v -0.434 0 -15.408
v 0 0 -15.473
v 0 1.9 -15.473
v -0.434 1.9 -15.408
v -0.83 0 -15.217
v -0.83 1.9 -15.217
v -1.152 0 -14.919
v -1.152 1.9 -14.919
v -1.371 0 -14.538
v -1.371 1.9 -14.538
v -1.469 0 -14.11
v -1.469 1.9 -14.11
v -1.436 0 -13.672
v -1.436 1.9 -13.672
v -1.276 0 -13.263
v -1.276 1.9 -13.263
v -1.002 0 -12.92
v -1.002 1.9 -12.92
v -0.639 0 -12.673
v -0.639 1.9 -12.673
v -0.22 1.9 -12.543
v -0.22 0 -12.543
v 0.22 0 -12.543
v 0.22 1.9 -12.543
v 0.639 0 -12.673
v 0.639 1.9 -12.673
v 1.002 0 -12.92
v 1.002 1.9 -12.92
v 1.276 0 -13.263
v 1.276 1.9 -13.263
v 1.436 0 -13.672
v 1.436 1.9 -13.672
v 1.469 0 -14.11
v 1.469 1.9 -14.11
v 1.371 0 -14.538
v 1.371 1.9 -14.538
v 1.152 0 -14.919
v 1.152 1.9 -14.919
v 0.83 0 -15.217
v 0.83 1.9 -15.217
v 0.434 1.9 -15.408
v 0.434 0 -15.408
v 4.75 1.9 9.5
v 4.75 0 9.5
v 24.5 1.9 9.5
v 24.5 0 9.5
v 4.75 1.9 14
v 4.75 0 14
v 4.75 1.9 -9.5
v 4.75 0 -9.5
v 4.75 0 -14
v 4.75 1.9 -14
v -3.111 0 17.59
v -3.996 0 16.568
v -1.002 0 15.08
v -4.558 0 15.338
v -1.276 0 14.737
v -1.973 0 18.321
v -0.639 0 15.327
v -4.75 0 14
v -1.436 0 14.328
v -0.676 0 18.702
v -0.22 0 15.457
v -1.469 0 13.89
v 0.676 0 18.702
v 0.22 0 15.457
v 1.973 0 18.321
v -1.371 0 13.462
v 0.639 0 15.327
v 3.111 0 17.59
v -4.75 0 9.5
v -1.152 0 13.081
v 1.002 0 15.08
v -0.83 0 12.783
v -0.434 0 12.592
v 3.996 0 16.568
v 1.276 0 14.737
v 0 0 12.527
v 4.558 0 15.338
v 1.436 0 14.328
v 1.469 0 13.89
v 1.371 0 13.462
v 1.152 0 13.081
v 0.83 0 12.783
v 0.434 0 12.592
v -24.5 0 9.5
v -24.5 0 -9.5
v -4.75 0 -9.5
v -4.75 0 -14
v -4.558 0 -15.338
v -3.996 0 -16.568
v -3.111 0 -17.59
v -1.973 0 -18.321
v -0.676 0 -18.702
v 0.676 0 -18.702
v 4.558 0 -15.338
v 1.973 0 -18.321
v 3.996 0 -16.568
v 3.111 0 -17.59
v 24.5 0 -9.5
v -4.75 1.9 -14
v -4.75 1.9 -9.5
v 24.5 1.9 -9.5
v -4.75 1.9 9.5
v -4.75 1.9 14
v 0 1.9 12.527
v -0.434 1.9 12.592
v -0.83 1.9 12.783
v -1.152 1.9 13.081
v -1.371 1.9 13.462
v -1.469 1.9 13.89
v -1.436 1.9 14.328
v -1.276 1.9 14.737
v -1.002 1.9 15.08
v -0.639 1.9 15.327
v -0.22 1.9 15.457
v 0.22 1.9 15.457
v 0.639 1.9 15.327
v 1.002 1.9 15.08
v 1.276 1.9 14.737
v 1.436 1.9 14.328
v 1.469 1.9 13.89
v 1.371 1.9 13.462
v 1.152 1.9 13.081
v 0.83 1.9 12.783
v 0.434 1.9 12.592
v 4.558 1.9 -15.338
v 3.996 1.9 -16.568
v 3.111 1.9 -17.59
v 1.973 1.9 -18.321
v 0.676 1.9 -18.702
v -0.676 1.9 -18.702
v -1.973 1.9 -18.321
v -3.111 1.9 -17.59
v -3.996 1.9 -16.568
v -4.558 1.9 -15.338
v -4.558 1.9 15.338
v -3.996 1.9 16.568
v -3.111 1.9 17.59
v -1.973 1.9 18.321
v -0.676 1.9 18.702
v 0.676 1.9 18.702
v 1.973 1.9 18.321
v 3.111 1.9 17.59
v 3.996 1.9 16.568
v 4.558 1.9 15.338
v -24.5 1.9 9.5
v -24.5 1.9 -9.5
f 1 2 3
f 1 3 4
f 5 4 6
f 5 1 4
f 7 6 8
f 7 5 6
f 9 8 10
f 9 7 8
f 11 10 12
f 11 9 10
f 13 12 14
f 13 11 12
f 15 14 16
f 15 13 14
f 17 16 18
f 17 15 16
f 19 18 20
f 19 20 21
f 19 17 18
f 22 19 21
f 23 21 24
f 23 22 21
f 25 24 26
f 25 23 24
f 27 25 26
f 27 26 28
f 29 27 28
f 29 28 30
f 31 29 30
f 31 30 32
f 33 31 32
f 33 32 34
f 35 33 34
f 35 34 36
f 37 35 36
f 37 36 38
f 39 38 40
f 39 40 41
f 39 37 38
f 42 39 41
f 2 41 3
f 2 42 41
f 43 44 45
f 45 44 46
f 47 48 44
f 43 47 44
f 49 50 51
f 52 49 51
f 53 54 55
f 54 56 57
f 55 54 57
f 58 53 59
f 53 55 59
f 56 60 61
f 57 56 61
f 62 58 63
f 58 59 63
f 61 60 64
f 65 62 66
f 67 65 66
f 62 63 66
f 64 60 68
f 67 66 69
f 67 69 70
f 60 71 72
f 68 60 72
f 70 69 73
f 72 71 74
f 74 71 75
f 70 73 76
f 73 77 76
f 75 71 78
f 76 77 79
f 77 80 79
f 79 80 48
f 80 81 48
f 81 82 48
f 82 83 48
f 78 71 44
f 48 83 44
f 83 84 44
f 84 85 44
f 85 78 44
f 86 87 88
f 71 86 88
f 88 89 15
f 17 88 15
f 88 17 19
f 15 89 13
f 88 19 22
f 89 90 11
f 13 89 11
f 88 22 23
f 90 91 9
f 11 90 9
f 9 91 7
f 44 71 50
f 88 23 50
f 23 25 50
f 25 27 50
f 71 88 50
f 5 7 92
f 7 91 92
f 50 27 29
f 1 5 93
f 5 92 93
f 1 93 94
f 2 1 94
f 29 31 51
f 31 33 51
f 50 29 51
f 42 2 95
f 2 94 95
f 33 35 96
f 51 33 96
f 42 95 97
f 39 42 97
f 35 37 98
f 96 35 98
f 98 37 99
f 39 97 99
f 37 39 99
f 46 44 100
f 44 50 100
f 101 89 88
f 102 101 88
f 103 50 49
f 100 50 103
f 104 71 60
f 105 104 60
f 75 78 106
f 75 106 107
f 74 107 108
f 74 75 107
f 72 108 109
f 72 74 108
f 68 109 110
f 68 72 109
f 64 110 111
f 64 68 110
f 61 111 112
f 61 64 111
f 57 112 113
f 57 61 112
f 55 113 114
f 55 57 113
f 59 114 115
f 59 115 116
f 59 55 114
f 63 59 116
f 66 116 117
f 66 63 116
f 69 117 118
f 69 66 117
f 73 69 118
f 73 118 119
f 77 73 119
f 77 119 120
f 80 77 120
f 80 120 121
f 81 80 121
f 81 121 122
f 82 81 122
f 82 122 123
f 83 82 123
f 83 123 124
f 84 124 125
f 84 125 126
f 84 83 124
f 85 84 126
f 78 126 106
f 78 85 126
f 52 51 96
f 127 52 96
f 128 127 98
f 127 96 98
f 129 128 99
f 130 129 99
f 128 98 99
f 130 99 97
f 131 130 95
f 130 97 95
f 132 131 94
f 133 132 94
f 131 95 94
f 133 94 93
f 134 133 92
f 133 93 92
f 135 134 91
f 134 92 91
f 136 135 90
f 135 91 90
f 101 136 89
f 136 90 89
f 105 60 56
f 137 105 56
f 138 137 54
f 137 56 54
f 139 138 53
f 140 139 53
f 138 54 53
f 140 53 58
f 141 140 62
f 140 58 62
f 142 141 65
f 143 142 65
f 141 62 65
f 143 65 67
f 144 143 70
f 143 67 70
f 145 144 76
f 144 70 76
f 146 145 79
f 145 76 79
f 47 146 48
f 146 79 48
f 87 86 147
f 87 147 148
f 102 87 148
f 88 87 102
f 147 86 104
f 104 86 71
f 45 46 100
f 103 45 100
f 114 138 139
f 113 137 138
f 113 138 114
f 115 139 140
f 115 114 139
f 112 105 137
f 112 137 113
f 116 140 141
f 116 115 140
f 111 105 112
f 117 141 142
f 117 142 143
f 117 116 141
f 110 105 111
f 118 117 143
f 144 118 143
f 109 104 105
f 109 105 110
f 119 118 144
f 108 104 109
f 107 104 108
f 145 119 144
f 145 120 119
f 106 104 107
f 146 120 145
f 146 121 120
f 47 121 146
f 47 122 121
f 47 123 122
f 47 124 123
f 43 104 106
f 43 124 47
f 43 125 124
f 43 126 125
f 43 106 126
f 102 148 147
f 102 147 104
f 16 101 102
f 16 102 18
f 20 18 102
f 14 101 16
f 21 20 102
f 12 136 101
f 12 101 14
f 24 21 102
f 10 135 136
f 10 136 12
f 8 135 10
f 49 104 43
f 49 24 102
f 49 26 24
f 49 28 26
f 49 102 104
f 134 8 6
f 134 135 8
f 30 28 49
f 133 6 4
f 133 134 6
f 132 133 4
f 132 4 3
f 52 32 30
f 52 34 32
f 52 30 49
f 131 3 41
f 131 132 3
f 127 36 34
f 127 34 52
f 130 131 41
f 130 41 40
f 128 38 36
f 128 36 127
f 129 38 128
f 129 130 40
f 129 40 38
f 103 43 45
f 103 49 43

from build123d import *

# Parameters (mm, degrees)
SKETCH1_W           = 49
SKETCH1_H           = 19
BOSS_EXTRUDE1_DEPTH = 1.9
SKETCH2_R           = 1.4732
BOSS_EXTRUDE2_DEPTH = 1.9


with BuildPart() as part:
    # Sketch1 → Boss-Extrude1 (new body)
    with BuildSketch(Plane(origin=(0, 0, 0), x_dir=(1, 0, 0), z_dir=(0, 1, 0))):
        Rectangle(SKETCH1_W, SKETCH1_H)
    extrude(amount=BOSS_EXTRUDE1_DEPTH)

    # Sketch2 → Boss-Extrude2 (add)
    # profile 1 of 2: a face of its own
    with BuildSketch(Plane(origin=(0, 0, 0), x_dir=(1, 0, 0), z_dir=(0, 1, 0))):
        with BuildLine():
            Line((-4.75, 14), (-4.75, 9.5))
            Line((-4.75, 9.5), (4.75, 9.5))
            Line((4.75, 9.5), (4.75, 14))
            ThreePointArc((4.75, 14), (0, 18.75), (-4.75, 14))
        make_face()
        with Locations(Location((0, 14, 0), (0, 0, 90))):
            Circle(SKETCH2_R, mode=Mode.SUBTRACT)
    # profile 2 of 2: a face of its own
    with BuildSketch(Plane(origin=(0, 0, 0), x_dir=(1, 0, 0), z_dir=(0, 1, 0))):
        with BuildLine():
            Line((4.75, -14), (4.75, -9.5))
            Line((4.75, -9.5), (-4.75, -9.5))
            Line((-4.75, -9.5), (-4.75, -14))
            ThreePointArc((-4.75, -14), (0, -18.75), (4.75, -14))
        make_face()
        with Locations(Location((0, -14, 0), (0, 0, 90))):
            Circle(SKETCH2_R, mode=Mode.SUBTRACT)
    extrude(amount=BOSS_EXTRUDE2_DEPTH)


solid = part.part
